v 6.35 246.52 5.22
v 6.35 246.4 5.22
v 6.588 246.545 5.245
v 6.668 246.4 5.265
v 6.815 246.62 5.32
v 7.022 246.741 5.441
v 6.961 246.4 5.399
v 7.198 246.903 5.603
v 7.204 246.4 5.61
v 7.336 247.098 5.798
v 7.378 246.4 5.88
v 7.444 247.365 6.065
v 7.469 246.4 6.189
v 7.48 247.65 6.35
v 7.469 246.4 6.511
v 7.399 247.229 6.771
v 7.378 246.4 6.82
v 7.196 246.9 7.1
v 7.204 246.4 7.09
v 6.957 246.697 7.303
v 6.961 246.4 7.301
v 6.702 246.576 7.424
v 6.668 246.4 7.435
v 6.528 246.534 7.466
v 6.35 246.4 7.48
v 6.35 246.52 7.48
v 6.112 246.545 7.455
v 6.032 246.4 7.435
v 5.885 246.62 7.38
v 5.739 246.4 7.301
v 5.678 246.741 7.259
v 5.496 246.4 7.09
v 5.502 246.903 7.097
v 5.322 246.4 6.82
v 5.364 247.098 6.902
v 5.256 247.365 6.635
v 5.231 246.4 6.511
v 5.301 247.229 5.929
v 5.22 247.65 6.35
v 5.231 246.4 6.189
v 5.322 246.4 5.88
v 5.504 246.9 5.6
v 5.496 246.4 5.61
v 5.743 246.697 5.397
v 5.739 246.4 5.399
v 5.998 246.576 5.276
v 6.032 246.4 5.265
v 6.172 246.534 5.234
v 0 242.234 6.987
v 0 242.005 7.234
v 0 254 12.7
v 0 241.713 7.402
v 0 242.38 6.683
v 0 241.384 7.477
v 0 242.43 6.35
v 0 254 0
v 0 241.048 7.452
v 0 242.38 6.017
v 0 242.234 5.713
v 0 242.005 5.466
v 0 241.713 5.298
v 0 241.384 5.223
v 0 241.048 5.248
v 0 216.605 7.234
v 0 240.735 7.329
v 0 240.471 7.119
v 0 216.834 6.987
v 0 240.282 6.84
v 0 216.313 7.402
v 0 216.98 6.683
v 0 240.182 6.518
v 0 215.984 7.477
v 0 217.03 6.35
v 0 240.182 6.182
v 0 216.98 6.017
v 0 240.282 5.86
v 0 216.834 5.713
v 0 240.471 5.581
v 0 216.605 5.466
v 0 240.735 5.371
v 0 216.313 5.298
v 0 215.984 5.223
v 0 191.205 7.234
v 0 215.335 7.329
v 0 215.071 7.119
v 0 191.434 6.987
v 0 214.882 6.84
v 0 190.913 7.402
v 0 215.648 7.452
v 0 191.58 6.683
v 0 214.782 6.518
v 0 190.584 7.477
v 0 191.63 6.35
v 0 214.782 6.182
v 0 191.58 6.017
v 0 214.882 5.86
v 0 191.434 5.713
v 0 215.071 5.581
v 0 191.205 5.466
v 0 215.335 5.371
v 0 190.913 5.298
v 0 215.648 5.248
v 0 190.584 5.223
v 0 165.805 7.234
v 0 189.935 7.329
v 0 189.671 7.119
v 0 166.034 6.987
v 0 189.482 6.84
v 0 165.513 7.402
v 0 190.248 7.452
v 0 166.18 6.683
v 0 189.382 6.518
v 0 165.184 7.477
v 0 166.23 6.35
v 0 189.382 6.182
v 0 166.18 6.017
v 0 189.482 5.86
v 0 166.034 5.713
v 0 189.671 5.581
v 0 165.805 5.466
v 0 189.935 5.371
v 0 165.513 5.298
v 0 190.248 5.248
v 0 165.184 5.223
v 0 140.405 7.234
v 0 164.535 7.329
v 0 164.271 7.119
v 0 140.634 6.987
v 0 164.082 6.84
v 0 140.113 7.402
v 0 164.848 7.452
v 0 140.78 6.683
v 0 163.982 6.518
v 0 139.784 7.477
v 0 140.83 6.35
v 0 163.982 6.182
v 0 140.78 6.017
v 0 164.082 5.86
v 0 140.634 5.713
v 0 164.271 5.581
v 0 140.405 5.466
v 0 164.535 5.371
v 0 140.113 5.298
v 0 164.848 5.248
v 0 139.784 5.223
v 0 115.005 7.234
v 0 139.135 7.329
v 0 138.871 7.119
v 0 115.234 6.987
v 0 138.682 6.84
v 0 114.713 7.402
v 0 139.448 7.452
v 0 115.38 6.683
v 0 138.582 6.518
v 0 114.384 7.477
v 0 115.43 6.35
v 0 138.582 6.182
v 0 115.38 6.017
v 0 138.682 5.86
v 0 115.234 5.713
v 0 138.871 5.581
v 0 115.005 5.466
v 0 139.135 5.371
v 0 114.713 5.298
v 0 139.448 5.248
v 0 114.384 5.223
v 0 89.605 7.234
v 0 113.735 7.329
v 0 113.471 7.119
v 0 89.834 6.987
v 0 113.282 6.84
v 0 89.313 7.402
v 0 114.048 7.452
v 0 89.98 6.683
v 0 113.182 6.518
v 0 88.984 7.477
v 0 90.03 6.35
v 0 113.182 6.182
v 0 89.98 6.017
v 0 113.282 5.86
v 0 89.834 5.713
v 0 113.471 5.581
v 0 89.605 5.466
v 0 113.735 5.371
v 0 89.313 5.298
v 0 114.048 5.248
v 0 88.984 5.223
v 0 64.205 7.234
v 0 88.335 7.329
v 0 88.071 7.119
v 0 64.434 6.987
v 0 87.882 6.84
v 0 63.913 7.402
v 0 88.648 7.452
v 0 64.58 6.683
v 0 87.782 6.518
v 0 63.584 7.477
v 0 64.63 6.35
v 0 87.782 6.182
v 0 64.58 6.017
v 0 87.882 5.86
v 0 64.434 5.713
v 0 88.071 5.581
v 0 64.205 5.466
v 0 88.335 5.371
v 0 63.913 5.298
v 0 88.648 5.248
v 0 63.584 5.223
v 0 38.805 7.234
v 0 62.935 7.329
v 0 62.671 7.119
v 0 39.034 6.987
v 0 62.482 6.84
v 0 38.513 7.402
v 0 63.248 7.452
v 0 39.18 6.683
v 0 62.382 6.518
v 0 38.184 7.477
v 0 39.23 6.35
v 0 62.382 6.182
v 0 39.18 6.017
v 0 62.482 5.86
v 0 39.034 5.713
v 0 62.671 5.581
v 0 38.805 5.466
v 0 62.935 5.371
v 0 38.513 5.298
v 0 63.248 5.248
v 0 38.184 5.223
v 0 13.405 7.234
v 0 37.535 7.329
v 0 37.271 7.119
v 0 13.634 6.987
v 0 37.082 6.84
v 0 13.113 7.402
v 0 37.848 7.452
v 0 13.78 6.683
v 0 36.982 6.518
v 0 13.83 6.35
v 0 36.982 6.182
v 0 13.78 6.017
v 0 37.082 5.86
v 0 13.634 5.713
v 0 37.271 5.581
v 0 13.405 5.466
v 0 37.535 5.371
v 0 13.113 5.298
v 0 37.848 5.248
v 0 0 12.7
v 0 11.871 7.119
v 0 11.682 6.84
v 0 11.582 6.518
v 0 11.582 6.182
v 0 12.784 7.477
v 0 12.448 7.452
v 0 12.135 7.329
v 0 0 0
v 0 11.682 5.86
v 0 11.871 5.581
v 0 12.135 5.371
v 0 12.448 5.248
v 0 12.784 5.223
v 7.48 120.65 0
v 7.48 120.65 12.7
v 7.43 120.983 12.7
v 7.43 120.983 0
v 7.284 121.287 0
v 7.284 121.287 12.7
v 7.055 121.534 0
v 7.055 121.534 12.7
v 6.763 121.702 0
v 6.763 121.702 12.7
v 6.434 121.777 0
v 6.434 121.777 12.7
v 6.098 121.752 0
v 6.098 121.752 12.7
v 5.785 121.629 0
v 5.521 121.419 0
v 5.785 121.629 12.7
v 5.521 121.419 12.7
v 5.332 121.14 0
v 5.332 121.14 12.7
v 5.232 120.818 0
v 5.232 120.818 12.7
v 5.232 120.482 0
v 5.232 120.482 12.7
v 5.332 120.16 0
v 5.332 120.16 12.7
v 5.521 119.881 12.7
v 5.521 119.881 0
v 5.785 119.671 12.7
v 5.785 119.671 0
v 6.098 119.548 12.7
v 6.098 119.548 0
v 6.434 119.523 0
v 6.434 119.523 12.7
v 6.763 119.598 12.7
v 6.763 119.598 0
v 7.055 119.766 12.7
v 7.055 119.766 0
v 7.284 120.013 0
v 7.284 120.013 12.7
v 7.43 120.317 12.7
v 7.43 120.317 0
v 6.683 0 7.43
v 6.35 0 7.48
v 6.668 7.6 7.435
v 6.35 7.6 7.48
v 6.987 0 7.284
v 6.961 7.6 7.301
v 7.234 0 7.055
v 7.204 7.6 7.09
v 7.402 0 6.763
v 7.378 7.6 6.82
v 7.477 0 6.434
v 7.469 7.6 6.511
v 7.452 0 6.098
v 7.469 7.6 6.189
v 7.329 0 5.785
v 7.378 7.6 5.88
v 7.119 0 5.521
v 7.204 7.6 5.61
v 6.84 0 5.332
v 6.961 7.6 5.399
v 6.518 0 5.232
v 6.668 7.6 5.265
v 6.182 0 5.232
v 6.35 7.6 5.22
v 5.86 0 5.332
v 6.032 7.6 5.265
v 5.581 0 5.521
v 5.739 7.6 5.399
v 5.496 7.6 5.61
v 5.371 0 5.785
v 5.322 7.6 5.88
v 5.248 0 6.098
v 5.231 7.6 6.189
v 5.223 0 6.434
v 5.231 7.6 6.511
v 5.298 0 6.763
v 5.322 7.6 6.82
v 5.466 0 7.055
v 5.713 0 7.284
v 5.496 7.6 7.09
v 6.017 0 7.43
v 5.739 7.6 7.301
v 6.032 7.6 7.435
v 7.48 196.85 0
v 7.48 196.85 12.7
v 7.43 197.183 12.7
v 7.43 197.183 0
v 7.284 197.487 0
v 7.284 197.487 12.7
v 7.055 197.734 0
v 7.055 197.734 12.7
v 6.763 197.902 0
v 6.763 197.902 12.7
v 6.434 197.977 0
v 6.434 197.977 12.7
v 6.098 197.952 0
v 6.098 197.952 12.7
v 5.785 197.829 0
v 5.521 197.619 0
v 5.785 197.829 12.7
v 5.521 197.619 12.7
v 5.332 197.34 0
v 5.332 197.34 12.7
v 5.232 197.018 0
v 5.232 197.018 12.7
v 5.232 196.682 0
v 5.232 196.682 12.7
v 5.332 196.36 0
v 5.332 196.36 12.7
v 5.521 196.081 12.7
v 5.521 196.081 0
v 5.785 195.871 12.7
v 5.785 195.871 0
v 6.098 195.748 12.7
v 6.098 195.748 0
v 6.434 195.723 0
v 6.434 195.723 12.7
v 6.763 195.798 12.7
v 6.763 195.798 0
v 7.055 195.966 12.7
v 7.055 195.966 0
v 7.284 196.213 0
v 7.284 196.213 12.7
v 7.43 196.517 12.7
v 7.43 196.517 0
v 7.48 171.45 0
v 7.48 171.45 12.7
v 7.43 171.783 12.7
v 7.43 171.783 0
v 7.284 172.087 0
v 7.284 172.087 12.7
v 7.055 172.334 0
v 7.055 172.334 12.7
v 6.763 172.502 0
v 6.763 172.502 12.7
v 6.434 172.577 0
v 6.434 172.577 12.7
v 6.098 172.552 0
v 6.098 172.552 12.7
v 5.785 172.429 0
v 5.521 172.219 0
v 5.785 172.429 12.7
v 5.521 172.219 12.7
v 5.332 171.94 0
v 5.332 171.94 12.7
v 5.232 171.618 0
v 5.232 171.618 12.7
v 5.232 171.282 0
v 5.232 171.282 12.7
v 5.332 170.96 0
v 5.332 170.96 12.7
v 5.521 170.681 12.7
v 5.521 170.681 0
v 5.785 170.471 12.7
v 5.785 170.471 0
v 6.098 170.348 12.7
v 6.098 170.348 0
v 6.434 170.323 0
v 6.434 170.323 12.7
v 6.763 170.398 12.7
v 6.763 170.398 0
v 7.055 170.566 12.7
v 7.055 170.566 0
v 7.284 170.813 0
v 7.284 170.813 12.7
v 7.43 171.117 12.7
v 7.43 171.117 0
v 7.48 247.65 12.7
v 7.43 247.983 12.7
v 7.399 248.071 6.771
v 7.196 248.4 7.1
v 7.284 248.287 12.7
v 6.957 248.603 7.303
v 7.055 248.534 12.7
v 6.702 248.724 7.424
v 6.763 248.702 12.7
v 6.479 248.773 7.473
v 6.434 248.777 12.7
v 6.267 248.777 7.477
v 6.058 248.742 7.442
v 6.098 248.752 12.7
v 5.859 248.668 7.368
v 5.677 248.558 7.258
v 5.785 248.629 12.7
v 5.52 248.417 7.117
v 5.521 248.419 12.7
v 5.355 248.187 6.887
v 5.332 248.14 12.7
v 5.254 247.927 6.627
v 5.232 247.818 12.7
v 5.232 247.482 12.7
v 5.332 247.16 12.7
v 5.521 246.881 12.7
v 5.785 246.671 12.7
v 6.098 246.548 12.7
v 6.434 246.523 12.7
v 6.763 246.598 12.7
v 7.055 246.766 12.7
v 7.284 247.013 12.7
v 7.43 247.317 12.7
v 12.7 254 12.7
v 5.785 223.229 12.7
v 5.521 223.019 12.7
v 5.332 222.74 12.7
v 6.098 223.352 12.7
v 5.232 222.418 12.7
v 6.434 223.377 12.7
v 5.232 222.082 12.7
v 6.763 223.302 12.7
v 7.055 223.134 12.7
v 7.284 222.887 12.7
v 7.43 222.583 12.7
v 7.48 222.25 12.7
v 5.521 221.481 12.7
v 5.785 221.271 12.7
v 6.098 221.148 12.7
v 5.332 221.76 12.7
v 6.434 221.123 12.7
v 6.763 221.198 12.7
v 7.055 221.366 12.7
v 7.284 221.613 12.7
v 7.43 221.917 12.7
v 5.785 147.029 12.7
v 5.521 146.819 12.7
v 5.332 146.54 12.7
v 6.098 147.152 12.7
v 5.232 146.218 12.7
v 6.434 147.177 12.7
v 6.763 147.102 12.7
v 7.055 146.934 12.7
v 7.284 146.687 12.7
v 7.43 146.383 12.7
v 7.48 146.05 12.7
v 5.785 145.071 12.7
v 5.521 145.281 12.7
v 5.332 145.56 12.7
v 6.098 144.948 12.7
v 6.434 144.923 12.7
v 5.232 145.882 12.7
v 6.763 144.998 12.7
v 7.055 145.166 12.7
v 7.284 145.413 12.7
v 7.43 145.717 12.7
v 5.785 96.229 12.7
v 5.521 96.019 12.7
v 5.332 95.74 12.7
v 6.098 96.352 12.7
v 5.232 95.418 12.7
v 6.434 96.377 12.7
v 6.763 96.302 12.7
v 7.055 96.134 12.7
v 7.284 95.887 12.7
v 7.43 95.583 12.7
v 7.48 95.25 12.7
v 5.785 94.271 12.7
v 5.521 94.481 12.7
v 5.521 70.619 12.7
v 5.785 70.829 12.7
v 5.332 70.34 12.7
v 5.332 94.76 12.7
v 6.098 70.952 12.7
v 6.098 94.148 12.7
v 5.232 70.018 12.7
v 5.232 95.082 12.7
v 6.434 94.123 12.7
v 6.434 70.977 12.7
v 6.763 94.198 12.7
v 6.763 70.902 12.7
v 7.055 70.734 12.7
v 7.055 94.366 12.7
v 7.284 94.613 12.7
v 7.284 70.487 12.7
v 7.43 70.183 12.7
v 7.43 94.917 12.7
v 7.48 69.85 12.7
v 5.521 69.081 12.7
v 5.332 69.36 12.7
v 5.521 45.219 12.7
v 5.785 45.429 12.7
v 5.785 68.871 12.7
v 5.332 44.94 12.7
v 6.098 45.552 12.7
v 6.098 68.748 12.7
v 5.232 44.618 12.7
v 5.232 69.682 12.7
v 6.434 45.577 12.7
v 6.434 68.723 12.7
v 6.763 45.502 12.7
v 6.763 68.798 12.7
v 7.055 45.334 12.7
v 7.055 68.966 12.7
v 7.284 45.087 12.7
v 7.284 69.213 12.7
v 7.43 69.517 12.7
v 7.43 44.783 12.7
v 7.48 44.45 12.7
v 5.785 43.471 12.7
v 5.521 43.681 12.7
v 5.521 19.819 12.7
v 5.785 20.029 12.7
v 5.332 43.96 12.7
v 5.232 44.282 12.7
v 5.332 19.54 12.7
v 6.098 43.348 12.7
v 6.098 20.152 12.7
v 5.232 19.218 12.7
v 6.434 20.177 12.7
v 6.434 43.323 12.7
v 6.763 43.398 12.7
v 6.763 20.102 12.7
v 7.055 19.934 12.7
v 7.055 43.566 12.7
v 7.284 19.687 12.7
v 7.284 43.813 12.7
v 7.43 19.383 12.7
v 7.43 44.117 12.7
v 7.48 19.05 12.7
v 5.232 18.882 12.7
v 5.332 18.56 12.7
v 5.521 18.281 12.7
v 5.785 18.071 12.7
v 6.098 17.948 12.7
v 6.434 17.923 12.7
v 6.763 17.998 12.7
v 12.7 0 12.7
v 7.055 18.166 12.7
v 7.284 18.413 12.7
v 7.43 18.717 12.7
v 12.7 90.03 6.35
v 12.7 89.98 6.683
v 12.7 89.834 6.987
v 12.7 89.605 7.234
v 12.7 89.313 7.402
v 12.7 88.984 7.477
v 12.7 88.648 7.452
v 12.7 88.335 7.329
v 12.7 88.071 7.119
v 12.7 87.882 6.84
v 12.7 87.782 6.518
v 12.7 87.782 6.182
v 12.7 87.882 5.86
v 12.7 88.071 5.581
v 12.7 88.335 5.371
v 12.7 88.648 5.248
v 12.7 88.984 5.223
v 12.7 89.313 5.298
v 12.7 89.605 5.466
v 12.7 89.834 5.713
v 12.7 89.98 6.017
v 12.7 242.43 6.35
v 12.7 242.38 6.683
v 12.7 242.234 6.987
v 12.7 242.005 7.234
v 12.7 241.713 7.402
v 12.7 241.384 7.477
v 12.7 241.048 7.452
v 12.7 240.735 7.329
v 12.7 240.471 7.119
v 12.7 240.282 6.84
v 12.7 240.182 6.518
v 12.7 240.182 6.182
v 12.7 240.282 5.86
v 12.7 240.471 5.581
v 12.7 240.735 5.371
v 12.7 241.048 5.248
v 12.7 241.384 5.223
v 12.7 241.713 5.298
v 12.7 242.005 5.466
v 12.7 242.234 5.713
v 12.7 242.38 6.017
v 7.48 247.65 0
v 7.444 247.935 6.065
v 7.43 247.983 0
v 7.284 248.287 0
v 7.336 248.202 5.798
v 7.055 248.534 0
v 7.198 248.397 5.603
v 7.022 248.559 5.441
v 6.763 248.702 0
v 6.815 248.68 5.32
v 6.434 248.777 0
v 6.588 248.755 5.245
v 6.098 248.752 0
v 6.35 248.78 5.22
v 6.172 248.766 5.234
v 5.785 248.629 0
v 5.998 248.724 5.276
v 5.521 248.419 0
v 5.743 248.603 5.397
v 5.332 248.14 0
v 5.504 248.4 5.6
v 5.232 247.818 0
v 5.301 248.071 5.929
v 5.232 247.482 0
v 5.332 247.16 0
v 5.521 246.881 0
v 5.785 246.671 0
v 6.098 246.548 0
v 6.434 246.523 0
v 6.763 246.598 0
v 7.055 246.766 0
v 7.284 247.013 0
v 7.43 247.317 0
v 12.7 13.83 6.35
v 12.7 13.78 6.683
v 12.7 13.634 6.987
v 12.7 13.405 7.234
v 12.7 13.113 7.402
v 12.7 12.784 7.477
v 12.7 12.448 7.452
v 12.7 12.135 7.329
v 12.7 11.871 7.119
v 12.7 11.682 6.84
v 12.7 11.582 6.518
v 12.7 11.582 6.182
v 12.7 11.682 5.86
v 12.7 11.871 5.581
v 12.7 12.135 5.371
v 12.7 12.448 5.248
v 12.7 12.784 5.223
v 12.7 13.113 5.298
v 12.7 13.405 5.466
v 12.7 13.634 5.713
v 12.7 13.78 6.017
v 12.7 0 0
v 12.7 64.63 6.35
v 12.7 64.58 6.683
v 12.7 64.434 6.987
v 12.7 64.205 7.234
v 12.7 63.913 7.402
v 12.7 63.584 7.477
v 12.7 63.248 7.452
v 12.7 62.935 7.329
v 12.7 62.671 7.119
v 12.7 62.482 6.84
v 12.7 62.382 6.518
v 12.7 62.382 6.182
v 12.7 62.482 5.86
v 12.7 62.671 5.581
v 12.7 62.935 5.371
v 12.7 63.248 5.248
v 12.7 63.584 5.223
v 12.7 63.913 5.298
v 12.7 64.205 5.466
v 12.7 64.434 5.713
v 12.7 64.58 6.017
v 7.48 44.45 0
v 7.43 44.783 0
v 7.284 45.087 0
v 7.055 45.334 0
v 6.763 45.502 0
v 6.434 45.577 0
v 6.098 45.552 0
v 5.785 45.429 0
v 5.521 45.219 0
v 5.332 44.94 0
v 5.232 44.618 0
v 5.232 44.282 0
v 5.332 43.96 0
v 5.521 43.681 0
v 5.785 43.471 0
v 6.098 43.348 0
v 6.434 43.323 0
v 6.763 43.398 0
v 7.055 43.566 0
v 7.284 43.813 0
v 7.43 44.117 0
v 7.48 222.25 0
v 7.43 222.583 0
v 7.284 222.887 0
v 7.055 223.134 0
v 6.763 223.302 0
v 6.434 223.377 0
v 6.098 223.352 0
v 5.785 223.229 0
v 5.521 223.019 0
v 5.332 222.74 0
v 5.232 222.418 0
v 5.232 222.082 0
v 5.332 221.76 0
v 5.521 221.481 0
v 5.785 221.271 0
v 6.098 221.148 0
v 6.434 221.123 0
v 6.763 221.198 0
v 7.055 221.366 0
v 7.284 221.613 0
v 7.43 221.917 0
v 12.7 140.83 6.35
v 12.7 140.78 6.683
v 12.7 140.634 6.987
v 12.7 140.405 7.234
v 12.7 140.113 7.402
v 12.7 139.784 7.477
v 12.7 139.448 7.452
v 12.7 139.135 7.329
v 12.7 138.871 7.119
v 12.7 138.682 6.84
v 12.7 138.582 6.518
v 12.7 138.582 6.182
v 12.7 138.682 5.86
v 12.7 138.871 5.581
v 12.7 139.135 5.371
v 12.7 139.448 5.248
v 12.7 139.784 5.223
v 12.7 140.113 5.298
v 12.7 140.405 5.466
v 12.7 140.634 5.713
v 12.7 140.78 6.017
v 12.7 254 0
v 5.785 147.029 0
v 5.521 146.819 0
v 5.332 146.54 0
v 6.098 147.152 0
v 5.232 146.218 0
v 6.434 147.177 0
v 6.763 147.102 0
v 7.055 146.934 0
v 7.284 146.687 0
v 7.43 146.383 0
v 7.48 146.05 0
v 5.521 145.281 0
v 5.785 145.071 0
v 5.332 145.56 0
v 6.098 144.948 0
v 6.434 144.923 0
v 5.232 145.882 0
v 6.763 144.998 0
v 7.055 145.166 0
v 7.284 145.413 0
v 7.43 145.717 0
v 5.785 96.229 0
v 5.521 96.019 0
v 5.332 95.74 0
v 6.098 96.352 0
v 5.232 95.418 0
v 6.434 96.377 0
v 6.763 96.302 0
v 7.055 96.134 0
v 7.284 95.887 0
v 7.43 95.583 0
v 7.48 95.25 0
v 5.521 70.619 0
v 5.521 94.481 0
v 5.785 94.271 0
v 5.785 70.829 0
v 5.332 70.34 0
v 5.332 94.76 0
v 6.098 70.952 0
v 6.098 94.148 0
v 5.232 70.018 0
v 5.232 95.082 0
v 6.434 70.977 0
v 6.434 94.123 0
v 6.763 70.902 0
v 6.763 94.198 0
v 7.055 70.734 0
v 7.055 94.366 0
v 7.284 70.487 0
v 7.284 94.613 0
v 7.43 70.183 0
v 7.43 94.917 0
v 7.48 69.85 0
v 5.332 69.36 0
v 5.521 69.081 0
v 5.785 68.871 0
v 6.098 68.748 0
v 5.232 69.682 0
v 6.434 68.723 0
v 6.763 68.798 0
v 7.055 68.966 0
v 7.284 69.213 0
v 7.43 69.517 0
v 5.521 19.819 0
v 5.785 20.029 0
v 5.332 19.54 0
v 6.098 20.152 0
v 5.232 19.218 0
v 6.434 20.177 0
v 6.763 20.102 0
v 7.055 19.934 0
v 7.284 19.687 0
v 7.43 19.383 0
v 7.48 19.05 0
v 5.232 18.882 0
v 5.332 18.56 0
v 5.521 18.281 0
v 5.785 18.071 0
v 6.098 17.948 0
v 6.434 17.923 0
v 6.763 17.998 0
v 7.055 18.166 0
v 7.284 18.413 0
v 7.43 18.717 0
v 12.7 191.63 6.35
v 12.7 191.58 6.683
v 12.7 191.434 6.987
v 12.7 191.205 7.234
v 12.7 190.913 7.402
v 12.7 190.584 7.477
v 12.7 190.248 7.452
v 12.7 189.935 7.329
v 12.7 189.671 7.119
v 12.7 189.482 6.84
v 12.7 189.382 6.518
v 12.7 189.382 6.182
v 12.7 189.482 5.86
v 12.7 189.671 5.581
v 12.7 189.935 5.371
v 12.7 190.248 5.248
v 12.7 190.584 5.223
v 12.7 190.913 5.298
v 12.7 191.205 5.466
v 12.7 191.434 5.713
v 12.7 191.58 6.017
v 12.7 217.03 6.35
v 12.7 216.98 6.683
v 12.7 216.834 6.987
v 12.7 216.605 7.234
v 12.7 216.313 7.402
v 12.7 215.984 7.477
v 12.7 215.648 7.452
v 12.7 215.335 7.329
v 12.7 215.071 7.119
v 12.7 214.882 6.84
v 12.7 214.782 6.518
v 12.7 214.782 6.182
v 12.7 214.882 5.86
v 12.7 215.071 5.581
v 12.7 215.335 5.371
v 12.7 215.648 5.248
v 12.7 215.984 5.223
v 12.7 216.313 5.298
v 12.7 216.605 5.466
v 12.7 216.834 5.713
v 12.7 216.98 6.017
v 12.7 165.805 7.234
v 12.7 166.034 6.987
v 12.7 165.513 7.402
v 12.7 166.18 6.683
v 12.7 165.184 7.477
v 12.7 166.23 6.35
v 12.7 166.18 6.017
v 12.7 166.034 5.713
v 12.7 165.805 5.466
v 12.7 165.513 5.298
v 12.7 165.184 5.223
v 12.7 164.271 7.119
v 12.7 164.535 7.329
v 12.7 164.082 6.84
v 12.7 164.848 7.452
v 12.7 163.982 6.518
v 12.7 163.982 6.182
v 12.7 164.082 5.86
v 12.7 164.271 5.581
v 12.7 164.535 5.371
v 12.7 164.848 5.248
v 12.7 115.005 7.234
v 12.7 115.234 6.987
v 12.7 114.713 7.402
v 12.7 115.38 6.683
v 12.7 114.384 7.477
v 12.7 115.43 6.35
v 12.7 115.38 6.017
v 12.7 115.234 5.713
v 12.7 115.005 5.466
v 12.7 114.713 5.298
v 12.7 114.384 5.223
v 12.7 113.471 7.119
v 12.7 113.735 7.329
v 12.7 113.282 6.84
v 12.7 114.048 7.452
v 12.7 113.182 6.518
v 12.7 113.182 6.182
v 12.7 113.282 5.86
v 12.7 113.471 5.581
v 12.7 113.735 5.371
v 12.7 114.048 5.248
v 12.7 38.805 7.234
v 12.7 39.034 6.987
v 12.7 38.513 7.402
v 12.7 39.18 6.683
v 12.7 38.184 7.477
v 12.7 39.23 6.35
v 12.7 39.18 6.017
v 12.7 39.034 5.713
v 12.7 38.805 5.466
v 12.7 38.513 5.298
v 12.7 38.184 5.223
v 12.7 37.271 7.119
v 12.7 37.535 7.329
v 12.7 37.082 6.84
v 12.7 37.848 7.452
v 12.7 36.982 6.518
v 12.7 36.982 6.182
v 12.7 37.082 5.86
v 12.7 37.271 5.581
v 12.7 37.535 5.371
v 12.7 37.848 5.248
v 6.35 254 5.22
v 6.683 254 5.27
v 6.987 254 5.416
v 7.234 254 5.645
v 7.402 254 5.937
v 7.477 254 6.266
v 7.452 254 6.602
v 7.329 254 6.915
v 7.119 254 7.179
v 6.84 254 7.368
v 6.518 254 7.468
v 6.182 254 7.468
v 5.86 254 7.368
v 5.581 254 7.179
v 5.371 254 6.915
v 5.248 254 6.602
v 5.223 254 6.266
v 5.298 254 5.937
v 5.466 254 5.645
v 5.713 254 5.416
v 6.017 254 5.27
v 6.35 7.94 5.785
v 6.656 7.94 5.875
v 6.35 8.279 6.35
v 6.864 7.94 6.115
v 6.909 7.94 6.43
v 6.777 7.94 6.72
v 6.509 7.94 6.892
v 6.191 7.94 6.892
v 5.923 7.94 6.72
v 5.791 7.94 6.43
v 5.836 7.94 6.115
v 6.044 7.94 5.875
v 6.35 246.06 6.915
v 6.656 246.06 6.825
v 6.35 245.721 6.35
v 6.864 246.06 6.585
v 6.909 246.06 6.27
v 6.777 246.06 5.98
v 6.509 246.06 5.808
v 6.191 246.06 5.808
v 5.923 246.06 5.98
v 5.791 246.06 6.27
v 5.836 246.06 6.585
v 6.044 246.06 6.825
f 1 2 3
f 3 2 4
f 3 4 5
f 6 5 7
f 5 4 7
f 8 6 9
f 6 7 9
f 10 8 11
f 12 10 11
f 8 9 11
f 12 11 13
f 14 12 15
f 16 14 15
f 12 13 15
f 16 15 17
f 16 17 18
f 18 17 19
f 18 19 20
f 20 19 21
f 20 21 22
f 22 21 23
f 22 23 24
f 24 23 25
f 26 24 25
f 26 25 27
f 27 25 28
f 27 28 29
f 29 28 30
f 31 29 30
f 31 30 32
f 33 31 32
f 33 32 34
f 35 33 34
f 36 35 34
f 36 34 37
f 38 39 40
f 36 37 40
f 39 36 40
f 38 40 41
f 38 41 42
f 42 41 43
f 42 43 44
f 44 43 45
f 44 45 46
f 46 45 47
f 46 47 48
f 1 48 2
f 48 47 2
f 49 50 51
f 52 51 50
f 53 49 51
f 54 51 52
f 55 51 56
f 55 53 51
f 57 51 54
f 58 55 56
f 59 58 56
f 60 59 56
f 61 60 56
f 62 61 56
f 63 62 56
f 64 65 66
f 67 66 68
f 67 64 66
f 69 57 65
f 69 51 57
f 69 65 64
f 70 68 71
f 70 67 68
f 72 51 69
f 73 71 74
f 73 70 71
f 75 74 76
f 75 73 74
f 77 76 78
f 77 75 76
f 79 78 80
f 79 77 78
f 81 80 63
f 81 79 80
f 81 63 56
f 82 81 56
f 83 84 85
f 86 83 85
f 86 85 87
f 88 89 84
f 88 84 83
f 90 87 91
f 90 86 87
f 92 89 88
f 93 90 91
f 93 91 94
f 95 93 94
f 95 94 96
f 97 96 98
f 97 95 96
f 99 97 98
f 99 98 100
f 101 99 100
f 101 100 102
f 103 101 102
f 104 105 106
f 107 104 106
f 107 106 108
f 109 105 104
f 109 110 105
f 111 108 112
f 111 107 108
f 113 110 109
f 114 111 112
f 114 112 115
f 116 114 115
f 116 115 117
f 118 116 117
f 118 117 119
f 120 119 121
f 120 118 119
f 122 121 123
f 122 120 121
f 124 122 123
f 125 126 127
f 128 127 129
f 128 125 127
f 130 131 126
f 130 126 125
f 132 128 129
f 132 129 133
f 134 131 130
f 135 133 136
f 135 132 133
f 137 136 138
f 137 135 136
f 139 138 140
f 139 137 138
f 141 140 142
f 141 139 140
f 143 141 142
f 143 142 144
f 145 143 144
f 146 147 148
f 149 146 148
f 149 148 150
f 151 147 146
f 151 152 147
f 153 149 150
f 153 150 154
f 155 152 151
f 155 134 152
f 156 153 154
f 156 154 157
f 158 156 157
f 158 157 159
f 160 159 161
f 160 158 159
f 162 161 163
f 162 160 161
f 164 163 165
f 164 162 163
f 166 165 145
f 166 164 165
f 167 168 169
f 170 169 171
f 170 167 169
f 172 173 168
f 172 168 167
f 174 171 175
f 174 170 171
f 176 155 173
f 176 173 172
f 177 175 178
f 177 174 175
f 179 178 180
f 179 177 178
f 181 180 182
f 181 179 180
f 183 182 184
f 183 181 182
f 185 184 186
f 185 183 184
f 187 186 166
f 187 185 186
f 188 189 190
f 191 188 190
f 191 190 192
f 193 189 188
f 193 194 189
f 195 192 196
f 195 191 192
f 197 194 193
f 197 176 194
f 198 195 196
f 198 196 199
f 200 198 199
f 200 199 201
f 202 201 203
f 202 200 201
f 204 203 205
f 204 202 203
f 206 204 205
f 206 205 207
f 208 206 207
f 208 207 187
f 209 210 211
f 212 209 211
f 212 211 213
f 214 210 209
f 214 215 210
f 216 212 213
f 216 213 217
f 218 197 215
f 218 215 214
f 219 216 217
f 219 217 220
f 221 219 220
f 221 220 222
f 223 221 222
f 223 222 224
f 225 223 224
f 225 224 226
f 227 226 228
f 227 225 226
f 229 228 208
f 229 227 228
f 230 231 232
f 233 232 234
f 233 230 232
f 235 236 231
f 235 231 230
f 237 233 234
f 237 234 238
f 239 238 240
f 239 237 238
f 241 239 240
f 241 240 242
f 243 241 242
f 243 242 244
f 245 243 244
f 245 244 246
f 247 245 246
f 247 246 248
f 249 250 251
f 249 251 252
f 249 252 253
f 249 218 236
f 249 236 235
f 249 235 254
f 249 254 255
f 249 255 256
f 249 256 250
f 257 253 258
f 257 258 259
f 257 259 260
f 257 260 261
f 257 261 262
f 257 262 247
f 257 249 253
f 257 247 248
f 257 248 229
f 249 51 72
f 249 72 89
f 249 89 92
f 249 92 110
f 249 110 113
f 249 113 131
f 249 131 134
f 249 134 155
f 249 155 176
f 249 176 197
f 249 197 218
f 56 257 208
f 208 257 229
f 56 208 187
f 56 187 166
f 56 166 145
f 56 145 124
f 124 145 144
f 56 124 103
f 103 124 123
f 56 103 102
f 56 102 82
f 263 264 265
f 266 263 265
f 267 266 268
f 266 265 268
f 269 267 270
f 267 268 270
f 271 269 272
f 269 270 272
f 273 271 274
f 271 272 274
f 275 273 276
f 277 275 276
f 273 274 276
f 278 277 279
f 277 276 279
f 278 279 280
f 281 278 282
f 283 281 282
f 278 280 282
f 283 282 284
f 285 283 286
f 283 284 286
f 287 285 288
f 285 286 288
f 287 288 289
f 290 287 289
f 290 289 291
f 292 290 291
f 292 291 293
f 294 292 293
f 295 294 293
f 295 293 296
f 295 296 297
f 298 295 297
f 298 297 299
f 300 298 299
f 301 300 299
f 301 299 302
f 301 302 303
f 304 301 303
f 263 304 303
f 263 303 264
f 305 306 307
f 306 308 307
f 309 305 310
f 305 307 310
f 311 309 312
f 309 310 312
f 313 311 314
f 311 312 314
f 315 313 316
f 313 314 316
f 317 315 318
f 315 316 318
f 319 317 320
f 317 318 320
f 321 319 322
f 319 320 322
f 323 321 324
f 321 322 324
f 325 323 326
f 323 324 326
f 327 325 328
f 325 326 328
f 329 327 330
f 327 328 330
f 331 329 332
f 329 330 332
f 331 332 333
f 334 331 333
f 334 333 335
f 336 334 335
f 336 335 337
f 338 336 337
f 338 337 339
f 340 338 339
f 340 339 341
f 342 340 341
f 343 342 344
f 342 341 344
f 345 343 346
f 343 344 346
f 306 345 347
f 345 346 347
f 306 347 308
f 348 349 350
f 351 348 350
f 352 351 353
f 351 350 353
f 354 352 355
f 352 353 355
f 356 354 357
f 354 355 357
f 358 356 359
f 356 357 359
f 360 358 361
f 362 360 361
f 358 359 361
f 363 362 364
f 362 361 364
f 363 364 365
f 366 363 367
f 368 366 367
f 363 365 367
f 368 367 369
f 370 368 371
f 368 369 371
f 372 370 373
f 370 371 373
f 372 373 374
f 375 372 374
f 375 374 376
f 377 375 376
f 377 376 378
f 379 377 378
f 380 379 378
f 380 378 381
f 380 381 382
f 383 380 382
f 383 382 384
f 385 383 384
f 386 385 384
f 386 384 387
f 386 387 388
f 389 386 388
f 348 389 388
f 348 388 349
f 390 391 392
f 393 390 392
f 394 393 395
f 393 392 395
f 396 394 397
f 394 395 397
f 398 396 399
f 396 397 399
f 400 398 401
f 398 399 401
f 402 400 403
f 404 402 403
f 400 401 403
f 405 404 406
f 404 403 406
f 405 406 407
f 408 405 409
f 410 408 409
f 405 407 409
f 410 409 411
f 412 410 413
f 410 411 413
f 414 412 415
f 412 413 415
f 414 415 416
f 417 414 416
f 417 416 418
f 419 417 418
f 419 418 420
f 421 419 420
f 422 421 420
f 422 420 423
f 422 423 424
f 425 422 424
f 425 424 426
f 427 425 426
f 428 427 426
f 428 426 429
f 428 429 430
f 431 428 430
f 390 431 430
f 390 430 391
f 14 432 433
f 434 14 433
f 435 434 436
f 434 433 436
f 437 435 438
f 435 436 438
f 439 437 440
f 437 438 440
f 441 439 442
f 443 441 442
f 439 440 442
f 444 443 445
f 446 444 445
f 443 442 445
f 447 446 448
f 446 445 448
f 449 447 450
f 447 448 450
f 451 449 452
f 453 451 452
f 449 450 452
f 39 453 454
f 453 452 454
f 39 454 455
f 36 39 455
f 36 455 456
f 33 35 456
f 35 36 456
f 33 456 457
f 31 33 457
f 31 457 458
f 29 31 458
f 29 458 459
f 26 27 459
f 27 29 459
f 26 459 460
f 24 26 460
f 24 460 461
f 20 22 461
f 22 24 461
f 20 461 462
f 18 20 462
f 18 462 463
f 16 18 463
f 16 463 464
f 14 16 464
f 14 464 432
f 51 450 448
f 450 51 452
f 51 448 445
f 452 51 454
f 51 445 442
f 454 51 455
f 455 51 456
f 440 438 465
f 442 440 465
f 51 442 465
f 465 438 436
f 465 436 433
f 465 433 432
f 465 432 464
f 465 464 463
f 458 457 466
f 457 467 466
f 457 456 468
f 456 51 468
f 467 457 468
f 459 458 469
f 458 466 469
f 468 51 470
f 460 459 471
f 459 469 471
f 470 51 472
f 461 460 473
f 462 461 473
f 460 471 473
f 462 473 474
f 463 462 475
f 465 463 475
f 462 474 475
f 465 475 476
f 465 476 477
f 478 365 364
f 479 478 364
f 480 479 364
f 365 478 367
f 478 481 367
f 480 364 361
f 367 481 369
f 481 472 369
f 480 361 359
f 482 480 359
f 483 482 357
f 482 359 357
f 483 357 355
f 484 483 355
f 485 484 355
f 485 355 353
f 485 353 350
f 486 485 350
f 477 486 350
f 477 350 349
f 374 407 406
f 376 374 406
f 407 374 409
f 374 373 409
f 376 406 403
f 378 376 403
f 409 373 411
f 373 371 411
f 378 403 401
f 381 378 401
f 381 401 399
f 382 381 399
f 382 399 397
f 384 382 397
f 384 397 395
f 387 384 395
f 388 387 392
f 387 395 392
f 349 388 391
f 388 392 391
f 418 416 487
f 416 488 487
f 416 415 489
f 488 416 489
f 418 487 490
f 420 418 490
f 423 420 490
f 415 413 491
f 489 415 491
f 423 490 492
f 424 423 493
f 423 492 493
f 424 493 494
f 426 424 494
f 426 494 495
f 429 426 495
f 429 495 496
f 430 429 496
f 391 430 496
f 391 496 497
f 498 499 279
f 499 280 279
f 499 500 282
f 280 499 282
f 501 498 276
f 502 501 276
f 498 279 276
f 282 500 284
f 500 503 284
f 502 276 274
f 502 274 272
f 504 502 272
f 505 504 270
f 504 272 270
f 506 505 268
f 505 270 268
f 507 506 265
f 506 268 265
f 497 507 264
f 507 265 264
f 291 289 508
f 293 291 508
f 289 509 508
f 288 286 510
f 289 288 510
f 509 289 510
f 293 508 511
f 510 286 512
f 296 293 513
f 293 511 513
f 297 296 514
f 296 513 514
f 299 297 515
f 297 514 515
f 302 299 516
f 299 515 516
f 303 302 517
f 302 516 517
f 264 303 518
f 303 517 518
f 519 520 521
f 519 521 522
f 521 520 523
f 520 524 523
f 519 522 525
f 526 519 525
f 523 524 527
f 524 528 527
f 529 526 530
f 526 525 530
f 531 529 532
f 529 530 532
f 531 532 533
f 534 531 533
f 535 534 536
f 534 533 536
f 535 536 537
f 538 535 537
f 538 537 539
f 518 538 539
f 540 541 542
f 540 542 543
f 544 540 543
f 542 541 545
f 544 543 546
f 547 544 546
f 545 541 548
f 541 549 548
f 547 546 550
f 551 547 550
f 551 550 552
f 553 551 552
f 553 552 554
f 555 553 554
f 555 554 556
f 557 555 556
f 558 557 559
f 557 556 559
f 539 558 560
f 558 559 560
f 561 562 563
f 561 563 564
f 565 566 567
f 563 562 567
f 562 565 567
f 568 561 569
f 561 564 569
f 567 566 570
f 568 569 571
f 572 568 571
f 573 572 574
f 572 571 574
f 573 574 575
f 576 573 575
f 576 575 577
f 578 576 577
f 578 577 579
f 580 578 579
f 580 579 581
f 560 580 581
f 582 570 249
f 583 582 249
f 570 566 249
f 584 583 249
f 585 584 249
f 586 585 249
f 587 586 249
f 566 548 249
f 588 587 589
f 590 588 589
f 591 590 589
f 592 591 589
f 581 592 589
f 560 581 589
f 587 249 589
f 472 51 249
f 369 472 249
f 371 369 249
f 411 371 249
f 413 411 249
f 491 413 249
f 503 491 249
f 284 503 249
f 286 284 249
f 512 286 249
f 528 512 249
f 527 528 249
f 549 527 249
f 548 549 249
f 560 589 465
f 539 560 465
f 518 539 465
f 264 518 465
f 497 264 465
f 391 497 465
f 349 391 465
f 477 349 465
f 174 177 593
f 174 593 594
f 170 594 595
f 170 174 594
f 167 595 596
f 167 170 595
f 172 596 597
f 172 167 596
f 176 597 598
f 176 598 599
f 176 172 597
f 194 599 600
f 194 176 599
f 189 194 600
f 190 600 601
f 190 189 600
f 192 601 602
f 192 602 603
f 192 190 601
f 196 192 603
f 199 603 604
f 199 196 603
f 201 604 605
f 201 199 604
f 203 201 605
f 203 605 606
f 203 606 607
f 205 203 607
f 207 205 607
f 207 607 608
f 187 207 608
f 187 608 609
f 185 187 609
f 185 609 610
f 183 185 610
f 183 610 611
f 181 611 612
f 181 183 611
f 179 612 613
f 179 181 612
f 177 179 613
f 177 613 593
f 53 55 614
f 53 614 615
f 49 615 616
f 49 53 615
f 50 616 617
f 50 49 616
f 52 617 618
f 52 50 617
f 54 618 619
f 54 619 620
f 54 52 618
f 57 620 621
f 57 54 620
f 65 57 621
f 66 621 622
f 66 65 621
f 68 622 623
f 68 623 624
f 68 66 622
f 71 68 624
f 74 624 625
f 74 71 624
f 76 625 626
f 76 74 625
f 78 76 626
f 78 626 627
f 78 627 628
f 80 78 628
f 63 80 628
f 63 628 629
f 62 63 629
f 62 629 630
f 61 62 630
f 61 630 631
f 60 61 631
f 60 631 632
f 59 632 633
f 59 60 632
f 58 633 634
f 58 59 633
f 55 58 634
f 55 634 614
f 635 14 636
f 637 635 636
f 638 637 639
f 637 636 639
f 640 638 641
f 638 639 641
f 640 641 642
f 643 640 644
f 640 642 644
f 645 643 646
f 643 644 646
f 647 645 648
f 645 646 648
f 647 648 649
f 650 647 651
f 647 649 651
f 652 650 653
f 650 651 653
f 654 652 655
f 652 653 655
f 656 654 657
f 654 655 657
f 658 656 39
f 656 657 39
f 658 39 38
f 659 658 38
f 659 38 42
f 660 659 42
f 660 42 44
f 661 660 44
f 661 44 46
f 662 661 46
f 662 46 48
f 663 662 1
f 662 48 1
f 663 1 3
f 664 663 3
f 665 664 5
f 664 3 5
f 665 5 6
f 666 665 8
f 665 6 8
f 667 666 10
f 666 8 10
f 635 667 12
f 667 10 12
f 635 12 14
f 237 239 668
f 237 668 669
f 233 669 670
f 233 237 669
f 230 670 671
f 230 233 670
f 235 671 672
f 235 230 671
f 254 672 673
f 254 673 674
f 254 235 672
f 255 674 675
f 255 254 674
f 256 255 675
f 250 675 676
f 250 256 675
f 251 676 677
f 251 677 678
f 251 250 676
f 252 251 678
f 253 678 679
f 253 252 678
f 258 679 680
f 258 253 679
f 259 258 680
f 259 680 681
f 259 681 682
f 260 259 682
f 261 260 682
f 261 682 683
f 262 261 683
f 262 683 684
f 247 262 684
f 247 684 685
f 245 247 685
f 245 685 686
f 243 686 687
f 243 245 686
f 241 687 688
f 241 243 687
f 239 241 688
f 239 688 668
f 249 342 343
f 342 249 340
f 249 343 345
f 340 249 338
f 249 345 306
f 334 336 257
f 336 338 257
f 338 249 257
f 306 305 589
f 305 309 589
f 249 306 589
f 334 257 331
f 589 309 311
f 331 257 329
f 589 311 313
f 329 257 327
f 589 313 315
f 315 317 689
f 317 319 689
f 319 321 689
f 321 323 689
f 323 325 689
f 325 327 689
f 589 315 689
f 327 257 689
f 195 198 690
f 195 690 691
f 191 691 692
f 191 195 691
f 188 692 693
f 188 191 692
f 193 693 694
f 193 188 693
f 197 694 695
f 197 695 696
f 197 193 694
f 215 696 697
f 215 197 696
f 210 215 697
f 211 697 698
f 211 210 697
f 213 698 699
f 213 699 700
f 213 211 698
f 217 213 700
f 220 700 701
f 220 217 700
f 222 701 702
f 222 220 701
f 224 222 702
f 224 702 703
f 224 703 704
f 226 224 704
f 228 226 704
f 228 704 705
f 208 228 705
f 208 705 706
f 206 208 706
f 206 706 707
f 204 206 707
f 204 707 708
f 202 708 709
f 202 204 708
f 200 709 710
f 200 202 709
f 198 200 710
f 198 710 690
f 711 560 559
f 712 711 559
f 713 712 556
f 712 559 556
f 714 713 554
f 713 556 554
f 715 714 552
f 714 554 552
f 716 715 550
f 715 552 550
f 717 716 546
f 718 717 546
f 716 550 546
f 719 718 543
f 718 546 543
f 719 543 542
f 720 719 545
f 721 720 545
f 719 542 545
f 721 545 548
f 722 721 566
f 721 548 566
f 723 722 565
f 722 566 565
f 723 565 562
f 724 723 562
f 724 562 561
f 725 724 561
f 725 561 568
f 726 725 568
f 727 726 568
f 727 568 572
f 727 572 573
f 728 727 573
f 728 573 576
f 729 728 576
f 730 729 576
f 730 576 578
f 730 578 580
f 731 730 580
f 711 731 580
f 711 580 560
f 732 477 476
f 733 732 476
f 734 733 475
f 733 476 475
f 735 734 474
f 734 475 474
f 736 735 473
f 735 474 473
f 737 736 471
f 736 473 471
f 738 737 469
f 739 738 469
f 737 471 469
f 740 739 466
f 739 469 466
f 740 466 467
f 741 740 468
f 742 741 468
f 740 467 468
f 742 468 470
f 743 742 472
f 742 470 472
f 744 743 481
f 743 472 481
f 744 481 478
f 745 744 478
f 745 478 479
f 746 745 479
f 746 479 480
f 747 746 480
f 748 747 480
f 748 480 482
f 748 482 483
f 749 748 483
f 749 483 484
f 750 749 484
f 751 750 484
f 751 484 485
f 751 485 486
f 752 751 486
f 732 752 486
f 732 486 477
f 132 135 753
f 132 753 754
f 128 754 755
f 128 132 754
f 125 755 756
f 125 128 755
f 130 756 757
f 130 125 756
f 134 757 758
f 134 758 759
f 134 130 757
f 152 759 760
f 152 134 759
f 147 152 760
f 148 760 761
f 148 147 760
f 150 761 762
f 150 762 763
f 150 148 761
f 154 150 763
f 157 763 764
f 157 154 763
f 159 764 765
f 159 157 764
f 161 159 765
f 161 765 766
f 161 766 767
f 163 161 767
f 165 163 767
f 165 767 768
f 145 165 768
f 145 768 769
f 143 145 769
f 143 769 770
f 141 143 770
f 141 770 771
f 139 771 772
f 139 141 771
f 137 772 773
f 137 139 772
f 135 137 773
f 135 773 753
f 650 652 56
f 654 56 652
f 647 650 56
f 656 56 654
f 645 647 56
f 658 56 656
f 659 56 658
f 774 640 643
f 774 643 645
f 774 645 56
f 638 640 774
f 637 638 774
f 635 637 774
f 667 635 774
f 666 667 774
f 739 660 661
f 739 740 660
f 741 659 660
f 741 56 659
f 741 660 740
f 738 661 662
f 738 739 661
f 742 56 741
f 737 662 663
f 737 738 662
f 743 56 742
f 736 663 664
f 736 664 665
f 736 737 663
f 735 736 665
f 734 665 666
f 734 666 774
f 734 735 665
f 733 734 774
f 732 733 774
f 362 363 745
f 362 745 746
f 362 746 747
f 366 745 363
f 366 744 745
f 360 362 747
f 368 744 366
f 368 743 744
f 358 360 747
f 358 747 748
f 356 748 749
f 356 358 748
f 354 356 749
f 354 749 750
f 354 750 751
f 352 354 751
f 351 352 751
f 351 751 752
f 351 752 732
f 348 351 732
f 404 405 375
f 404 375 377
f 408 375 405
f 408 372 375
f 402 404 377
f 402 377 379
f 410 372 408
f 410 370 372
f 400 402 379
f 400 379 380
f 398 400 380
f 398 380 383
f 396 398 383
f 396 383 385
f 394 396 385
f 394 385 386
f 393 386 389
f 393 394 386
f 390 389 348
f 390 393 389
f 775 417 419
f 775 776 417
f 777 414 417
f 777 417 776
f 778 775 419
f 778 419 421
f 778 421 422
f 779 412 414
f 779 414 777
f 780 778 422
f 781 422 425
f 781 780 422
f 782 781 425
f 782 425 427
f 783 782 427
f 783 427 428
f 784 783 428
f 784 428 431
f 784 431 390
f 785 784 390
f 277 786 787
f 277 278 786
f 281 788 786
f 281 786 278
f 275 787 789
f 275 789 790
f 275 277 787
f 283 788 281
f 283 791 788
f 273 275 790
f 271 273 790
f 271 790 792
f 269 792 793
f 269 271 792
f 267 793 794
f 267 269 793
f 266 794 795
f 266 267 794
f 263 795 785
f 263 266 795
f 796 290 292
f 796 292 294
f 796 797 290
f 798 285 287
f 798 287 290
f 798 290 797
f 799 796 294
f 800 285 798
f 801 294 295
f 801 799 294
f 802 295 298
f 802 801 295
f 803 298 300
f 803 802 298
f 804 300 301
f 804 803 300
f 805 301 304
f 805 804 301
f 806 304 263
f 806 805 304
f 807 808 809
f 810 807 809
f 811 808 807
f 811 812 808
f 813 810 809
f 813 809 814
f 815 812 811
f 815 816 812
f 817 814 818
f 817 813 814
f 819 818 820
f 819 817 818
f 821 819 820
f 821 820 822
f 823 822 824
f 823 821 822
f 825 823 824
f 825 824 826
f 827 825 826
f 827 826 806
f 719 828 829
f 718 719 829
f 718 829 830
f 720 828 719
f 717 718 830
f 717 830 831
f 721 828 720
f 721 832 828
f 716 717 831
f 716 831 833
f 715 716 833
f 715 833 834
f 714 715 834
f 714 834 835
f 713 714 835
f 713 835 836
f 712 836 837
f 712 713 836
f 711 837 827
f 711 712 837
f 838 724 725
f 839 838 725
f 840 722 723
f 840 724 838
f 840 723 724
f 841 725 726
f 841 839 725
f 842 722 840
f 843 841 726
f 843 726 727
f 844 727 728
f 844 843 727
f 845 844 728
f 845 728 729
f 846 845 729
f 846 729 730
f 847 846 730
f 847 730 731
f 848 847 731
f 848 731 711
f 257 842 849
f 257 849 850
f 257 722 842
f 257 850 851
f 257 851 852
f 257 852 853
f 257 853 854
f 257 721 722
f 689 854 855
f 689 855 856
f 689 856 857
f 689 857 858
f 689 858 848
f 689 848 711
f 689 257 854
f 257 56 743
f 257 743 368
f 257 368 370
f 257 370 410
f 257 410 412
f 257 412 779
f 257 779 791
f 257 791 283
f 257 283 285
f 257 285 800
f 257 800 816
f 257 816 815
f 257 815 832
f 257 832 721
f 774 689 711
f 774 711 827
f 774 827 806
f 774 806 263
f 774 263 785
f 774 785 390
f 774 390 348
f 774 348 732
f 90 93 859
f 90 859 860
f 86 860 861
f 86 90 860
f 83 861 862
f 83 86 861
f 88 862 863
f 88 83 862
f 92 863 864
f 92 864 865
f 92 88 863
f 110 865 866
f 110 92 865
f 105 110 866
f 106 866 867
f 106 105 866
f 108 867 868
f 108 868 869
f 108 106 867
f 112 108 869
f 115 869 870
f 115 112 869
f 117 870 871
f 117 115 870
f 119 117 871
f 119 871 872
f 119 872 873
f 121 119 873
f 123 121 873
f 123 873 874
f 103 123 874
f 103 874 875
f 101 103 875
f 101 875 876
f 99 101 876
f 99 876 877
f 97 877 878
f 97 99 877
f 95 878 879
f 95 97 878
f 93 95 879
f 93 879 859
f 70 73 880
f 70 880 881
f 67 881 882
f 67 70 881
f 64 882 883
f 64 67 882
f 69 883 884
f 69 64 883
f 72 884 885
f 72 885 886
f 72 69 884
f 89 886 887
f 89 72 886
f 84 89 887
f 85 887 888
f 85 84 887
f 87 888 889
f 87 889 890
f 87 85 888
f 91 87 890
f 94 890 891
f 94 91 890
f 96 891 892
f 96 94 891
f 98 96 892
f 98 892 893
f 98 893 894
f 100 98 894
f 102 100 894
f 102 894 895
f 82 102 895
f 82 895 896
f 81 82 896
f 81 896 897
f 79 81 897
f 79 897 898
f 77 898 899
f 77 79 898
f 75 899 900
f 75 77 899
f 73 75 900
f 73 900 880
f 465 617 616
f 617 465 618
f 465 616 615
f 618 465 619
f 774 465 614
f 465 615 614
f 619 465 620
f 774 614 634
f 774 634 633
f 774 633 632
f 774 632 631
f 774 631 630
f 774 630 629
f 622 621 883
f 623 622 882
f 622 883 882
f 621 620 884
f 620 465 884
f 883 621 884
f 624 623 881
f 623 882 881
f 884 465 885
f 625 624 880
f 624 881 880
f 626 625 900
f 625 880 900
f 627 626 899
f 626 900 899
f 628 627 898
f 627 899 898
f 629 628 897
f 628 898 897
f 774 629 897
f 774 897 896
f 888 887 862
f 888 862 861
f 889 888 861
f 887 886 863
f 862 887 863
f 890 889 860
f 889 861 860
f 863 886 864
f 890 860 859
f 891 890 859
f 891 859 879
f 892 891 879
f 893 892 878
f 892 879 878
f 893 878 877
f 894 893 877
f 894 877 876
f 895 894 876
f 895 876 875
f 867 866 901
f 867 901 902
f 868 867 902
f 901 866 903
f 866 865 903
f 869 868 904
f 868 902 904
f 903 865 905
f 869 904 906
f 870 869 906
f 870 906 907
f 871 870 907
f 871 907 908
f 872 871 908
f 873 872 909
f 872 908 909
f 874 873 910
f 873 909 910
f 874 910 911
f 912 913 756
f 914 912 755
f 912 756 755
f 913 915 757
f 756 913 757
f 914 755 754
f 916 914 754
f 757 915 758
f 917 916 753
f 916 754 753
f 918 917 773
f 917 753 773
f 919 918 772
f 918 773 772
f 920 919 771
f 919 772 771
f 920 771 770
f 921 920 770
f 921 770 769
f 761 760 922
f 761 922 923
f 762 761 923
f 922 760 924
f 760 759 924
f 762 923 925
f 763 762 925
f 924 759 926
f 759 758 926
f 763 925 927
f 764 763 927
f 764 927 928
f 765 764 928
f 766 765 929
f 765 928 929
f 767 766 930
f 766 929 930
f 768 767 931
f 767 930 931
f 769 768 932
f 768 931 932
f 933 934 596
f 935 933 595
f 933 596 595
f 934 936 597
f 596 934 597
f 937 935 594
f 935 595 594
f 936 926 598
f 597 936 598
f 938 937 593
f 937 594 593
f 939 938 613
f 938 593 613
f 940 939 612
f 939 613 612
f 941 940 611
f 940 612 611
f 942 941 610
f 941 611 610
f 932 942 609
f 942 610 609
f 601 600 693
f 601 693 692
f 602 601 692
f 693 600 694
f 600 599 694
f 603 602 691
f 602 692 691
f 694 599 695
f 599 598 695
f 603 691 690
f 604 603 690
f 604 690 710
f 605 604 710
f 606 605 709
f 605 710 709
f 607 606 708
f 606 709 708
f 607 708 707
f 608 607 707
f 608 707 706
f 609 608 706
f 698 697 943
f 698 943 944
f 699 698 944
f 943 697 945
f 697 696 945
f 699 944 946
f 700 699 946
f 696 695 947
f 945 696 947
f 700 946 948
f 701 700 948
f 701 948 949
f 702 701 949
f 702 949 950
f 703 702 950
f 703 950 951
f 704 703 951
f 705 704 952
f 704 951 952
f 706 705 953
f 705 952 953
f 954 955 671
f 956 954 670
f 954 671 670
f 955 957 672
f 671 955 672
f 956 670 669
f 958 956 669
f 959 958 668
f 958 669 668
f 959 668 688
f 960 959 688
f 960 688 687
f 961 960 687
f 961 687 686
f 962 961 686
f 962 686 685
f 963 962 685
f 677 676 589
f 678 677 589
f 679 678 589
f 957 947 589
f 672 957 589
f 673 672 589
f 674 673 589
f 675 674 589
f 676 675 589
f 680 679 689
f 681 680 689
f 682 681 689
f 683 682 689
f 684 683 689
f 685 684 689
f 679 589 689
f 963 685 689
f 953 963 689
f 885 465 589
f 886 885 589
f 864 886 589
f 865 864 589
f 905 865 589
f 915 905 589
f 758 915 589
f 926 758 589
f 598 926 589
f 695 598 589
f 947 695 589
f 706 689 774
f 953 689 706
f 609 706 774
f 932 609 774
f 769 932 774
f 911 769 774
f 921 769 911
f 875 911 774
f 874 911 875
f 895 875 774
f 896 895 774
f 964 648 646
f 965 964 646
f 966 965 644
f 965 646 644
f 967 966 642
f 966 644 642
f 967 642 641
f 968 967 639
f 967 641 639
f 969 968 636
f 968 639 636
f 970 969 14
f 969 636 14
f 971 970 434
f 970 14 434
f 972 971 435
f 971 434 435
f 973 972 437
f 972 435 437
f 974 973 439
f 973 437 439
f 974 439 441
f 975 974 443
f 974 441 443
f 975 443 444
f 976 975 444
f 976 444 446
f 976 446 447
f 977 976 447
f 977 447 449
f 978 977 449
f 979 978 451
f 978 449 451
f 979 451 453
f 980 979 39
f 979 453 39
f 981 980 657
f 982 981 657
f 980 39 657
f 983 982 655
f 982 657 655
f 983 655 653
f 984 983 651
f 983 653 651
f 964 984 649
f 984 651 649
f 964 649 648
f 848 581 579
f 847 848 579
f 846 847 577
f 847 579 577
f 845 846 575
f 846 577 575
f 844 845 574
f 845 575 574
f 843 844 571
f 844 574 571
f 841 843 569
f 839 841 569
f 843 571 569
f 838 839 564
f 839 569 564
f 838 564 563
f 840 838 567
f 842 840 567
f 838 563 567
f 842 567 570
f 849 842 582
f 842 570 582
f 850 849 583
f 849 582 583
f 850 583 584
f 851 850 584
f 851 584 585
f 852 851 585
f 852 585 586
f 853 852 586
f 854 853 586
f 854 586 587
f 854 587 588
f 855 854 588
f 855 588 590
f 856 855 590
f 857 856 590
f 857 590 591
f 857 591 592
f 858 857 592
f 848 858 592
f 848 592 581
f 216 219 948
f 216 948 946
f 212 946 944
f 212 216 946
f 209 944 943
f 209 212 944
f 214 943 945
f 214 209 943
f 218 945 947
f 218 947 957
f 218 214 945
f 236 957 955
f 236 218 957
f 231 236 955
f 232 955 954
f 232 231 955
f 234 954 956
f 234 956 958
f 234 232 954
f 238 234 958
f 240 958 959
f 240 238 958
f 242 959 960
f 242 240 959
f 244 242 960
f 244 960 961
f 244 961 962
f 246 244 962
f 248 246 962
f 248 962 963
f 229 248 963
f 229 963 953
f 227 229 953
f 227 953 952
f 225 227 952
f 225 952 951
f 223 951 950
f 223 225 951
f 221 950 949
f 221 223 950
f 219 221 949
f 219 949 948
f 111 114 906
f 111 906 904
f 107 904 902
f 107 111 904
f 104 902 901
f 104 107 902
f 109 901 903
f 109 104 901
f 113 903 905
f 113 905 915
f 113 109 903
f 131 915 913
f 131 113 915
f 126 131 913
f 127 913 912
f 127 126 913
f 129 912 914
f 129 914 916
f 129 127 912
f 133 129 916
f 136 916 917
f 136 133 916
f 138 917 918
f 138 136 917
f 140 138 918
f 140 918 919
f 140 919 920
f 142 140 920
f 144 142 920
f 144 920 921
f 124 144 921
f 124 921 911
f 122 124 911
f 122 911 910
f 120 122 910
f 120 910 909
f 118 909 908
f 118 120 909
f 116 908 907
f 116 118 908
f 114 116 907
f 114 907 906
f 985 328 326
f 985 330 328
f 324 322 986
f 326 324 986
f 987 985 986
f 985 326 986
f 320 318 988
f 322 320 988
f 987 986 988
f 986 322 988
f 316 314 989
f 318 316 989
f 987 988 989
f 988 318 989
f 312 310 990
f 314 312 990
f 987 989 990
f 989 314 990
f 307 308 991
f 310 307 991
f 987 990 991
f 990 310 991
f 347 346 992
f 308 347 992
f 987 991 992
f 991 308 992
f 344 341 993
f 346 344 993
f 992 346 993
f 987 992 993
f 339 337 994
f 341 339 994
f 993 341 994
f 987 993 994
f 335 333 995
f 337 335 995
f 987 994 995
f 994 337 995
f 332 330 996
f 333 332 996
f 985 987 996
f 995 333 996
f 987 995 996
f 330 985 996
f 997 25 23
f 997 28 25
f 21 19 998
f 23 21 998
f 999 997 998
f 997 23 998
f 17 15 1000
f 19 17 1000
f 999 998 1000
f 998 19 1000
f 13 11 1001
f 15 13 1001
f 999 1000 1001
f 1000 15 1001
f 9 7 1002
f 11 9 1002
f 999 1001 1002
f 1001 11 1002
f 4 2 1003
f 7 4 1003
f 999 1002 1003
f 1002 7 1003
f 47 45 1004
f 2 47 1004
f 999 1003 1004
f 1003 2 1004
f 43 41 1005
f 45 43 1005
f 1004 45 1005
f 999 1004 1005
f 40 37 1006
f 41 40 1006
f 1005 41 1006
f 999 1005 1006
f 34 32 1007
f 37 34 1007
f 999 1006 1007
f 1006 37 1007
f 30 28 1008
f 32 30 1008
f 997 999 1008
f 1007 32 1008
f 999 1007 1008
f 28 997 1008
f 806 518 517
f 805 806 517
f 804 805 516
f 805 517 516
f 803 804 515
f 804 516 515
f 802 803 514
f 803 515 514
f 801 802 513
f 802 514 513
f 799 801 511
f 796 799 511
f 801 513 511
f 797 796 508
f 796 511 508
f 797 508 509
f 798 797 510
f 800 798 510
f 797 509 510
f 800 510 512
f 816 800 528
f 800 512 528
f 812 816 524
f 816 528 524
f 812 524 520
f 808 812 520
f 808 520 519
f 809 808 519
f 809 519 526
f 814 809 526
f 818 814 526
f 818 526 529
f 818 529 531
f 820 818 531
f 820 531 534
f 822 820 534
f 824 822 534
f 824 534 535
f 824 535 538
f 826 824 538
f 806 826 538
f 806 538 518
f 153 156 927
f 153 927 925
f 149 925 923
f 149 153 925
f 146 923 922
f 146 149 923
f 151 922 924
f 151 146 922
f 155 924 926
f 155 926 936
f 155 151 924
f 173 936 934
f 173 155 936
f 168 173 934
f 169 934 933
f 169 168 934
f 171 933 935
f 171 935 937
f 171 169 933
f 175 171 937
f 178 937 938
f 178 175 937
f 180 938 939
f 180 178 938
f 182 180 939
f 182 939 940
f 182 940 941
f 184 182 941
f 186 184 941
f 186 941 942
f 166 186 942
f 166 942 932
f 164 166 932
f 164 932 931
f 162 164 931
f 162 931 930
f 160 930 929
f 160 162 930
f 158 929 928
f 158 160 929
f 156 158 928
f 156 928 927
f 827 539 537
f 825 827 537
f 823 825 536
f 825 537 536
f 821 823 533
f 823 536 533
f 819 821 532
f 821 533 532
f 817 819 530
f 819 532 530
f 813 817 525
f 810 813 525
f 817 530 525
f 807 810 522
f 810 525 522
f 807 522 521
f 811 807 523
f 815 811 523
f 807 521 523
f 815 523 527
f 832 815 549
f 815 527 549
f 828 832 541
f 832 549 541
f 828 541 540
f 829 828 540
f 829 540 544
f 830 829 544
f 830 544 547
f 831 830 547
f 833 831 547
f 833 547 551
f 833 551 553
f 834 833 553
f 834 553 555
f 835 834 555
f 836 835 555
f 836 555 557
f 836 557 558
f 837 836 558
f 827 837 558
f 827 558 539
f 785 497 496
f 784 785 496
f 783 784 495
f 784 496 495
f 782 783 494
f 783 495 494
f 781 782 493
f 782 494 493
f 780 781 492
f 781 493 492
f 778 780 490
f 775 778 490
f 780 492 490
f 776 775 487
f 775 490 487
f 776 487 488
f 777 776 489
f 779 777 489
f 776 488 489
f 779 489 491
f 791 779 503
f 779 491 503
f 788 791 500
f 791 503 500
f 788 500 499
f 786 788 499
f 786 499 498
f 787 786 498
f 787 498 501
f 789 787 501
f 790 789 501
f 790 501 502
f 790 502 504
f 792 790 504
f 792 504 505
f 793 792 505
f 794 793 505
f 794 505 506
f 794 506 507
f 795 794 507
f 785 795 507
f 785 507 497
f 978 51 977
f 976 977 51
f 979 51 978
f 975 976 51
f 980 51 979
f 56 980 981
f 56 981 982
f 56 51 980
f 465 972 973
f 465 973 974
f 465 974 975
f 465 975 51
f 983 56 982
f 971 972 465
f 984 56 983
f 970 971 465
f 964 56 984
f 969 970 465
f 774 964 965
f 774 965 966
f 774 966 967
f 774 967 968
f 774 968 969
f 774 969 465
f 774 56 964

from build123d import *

# Parameters (mm, degrees)
SKETCH1_W                           = 12.7
SKETCH1_H                           = 12.7
BOSS_EXTRUDE1_DEPTH                 = 254
F_4_40_TAPPED_HOLE1_D               = 2.2606
F_4_40_TAPPED_HOLE1_DEPTH           = 7.6
F_4_40_TAPPED_HOLE1_TIP             = 0.679152758
F_4_40_TAPPED_HOLE1_ON_FACE_2_D     = 2.2606
F_4_40_TAPPED_HOLE1_ON_FACE_2_DEPTH = 7.6
F_4_40_TAPPED_HOLE1_ON_FACE_2_TIP   = 0.679152758
F_4_40_TAPPED_HOLE2_D               = 2.2606
LPATTERN1_COUNT                     = 10
LPATTERN1_PITCH                     = 25.4
F_4_40_TAPPED_HOLE3_OUTLINE_R       = 1.1303
F_4_40_TAPPED_HOLE3_DEPTH           = 12.7
LPATTERN2_COUNT                     = 10
LPATTERN2_PITCH                     = 25.4


# Read off the part's stored shape, not the designer's step: #4-40 Tapped Hole3
with BuildPart() as part:
    # Sketch1 → Boss-Extrude1 (new body)
    with BuildSketch(Plane(origin=(0, 0, 0), x_dir=(1, 0, 0), z_dir=(0, 1, 0))):
        with Locations((6.35, -6.35)):
            Rectangle(SKETCH1_W, SKETCH1_H)
    extrude(amount=BOSS_EXTRUDE1_DEPTH)

    # #4-40 Tapped Hole1
    with Locations(Plane(origin=(6.35, 254, 6.35), x_dir=(0, 0, 1), z_dir=(0, 1, 0))):
        with Locations((0, 0)):
            Hole(F_4_40_TAPPED_HOLE1_D / 2, depth=F_4_40_TAPPED_HOLE1_DEPTH)
            with Locations((0, 0, -(F_4_40_TAPPED_HOLE1_DEPTH + F_4_40_TAPPED_HOLE1_TIP / 2))):  # 118° drill point
                Cone(0, F_4_40_TAPPED_HOLE1_D / 2, F_4_40_TAPPED_HOLE1_TIP, mode=Mode.SUBTRACT)

    # #4-40 Tapped Hole1 on face 2
    with Locations(Plane(origin=(6.35, 0, 6.35), x_dir=(0, 0, -1), z_dir=(0, -1, 0))):
        with Locations((0, 0)):
            Hole(F_4_40_TAPPED_HOLE1_ON_FACE_2_D / 2, depth=F_4_40_TAPPED_HOLE1_ON_FACE_2_DEPTH)
            with Locations((0, 0, -(F_4_40_TAPPED_HOLE1_ON_FACE_2_DEPTH + F_4_40_TAPPED_HOLE1_ON_FACE_2_TIP / 2))):  # 118° drill point
                Cone(0, F_4_40_TAPPED_HOLE1_ON_FACE_2_D / 2, F_4_40_TAPPED_HOLE1_ON_FACE_2_TIP, mode=Mode.SUBTRACT)

    # #4-40 Tapped Hole2 (through all)
    with Locations(Plane(origin=(6.35, 247.65, 0), x_dir=(-1, 0, 0), z_dir=(0, 0, -1))):
        with Locations((0, 0)):
            f_4_40_tapped_hole2 = Hole(F_4_40_TAPPED_HOLE2_D / 2)

    # LPattern1: #4-40 Tapped Hole2 ×10
    with Locations(*[(0, -i * LPATTERN1_PITCH, 0) for i in range(1, LPATTERN1_COUNT)]):
        add(f_4_40_tapped_hole2, mode=Mode.SUBTRACT)

    # #4-40 Tapped Hole3 outline → #4-40 Tapped Hole3 (cut)
    with BuildSketch(Plane.YZ):
        with Locations((241.3, 6.35)):
            Circle(F_4_40_TAPPED_HOLE3_OUTLINE_R)
    f_4_40_tapped_hole3 = extrude(amount=F_4_40_TAPPED_HOLE3_DEPTH, mode=Mode.SUBTRACT)

    # LPattern2: #4-40 Tapped Hole3 ×10
    with Locations(*[(0, -i * LPATTERN2_PITCH, 0) for i in range(1, LPATTERN2_COUNT)]):
        add(f_4_40_tapped_hole3, mode=Mode.SUBTRACT)


solid = part.part
